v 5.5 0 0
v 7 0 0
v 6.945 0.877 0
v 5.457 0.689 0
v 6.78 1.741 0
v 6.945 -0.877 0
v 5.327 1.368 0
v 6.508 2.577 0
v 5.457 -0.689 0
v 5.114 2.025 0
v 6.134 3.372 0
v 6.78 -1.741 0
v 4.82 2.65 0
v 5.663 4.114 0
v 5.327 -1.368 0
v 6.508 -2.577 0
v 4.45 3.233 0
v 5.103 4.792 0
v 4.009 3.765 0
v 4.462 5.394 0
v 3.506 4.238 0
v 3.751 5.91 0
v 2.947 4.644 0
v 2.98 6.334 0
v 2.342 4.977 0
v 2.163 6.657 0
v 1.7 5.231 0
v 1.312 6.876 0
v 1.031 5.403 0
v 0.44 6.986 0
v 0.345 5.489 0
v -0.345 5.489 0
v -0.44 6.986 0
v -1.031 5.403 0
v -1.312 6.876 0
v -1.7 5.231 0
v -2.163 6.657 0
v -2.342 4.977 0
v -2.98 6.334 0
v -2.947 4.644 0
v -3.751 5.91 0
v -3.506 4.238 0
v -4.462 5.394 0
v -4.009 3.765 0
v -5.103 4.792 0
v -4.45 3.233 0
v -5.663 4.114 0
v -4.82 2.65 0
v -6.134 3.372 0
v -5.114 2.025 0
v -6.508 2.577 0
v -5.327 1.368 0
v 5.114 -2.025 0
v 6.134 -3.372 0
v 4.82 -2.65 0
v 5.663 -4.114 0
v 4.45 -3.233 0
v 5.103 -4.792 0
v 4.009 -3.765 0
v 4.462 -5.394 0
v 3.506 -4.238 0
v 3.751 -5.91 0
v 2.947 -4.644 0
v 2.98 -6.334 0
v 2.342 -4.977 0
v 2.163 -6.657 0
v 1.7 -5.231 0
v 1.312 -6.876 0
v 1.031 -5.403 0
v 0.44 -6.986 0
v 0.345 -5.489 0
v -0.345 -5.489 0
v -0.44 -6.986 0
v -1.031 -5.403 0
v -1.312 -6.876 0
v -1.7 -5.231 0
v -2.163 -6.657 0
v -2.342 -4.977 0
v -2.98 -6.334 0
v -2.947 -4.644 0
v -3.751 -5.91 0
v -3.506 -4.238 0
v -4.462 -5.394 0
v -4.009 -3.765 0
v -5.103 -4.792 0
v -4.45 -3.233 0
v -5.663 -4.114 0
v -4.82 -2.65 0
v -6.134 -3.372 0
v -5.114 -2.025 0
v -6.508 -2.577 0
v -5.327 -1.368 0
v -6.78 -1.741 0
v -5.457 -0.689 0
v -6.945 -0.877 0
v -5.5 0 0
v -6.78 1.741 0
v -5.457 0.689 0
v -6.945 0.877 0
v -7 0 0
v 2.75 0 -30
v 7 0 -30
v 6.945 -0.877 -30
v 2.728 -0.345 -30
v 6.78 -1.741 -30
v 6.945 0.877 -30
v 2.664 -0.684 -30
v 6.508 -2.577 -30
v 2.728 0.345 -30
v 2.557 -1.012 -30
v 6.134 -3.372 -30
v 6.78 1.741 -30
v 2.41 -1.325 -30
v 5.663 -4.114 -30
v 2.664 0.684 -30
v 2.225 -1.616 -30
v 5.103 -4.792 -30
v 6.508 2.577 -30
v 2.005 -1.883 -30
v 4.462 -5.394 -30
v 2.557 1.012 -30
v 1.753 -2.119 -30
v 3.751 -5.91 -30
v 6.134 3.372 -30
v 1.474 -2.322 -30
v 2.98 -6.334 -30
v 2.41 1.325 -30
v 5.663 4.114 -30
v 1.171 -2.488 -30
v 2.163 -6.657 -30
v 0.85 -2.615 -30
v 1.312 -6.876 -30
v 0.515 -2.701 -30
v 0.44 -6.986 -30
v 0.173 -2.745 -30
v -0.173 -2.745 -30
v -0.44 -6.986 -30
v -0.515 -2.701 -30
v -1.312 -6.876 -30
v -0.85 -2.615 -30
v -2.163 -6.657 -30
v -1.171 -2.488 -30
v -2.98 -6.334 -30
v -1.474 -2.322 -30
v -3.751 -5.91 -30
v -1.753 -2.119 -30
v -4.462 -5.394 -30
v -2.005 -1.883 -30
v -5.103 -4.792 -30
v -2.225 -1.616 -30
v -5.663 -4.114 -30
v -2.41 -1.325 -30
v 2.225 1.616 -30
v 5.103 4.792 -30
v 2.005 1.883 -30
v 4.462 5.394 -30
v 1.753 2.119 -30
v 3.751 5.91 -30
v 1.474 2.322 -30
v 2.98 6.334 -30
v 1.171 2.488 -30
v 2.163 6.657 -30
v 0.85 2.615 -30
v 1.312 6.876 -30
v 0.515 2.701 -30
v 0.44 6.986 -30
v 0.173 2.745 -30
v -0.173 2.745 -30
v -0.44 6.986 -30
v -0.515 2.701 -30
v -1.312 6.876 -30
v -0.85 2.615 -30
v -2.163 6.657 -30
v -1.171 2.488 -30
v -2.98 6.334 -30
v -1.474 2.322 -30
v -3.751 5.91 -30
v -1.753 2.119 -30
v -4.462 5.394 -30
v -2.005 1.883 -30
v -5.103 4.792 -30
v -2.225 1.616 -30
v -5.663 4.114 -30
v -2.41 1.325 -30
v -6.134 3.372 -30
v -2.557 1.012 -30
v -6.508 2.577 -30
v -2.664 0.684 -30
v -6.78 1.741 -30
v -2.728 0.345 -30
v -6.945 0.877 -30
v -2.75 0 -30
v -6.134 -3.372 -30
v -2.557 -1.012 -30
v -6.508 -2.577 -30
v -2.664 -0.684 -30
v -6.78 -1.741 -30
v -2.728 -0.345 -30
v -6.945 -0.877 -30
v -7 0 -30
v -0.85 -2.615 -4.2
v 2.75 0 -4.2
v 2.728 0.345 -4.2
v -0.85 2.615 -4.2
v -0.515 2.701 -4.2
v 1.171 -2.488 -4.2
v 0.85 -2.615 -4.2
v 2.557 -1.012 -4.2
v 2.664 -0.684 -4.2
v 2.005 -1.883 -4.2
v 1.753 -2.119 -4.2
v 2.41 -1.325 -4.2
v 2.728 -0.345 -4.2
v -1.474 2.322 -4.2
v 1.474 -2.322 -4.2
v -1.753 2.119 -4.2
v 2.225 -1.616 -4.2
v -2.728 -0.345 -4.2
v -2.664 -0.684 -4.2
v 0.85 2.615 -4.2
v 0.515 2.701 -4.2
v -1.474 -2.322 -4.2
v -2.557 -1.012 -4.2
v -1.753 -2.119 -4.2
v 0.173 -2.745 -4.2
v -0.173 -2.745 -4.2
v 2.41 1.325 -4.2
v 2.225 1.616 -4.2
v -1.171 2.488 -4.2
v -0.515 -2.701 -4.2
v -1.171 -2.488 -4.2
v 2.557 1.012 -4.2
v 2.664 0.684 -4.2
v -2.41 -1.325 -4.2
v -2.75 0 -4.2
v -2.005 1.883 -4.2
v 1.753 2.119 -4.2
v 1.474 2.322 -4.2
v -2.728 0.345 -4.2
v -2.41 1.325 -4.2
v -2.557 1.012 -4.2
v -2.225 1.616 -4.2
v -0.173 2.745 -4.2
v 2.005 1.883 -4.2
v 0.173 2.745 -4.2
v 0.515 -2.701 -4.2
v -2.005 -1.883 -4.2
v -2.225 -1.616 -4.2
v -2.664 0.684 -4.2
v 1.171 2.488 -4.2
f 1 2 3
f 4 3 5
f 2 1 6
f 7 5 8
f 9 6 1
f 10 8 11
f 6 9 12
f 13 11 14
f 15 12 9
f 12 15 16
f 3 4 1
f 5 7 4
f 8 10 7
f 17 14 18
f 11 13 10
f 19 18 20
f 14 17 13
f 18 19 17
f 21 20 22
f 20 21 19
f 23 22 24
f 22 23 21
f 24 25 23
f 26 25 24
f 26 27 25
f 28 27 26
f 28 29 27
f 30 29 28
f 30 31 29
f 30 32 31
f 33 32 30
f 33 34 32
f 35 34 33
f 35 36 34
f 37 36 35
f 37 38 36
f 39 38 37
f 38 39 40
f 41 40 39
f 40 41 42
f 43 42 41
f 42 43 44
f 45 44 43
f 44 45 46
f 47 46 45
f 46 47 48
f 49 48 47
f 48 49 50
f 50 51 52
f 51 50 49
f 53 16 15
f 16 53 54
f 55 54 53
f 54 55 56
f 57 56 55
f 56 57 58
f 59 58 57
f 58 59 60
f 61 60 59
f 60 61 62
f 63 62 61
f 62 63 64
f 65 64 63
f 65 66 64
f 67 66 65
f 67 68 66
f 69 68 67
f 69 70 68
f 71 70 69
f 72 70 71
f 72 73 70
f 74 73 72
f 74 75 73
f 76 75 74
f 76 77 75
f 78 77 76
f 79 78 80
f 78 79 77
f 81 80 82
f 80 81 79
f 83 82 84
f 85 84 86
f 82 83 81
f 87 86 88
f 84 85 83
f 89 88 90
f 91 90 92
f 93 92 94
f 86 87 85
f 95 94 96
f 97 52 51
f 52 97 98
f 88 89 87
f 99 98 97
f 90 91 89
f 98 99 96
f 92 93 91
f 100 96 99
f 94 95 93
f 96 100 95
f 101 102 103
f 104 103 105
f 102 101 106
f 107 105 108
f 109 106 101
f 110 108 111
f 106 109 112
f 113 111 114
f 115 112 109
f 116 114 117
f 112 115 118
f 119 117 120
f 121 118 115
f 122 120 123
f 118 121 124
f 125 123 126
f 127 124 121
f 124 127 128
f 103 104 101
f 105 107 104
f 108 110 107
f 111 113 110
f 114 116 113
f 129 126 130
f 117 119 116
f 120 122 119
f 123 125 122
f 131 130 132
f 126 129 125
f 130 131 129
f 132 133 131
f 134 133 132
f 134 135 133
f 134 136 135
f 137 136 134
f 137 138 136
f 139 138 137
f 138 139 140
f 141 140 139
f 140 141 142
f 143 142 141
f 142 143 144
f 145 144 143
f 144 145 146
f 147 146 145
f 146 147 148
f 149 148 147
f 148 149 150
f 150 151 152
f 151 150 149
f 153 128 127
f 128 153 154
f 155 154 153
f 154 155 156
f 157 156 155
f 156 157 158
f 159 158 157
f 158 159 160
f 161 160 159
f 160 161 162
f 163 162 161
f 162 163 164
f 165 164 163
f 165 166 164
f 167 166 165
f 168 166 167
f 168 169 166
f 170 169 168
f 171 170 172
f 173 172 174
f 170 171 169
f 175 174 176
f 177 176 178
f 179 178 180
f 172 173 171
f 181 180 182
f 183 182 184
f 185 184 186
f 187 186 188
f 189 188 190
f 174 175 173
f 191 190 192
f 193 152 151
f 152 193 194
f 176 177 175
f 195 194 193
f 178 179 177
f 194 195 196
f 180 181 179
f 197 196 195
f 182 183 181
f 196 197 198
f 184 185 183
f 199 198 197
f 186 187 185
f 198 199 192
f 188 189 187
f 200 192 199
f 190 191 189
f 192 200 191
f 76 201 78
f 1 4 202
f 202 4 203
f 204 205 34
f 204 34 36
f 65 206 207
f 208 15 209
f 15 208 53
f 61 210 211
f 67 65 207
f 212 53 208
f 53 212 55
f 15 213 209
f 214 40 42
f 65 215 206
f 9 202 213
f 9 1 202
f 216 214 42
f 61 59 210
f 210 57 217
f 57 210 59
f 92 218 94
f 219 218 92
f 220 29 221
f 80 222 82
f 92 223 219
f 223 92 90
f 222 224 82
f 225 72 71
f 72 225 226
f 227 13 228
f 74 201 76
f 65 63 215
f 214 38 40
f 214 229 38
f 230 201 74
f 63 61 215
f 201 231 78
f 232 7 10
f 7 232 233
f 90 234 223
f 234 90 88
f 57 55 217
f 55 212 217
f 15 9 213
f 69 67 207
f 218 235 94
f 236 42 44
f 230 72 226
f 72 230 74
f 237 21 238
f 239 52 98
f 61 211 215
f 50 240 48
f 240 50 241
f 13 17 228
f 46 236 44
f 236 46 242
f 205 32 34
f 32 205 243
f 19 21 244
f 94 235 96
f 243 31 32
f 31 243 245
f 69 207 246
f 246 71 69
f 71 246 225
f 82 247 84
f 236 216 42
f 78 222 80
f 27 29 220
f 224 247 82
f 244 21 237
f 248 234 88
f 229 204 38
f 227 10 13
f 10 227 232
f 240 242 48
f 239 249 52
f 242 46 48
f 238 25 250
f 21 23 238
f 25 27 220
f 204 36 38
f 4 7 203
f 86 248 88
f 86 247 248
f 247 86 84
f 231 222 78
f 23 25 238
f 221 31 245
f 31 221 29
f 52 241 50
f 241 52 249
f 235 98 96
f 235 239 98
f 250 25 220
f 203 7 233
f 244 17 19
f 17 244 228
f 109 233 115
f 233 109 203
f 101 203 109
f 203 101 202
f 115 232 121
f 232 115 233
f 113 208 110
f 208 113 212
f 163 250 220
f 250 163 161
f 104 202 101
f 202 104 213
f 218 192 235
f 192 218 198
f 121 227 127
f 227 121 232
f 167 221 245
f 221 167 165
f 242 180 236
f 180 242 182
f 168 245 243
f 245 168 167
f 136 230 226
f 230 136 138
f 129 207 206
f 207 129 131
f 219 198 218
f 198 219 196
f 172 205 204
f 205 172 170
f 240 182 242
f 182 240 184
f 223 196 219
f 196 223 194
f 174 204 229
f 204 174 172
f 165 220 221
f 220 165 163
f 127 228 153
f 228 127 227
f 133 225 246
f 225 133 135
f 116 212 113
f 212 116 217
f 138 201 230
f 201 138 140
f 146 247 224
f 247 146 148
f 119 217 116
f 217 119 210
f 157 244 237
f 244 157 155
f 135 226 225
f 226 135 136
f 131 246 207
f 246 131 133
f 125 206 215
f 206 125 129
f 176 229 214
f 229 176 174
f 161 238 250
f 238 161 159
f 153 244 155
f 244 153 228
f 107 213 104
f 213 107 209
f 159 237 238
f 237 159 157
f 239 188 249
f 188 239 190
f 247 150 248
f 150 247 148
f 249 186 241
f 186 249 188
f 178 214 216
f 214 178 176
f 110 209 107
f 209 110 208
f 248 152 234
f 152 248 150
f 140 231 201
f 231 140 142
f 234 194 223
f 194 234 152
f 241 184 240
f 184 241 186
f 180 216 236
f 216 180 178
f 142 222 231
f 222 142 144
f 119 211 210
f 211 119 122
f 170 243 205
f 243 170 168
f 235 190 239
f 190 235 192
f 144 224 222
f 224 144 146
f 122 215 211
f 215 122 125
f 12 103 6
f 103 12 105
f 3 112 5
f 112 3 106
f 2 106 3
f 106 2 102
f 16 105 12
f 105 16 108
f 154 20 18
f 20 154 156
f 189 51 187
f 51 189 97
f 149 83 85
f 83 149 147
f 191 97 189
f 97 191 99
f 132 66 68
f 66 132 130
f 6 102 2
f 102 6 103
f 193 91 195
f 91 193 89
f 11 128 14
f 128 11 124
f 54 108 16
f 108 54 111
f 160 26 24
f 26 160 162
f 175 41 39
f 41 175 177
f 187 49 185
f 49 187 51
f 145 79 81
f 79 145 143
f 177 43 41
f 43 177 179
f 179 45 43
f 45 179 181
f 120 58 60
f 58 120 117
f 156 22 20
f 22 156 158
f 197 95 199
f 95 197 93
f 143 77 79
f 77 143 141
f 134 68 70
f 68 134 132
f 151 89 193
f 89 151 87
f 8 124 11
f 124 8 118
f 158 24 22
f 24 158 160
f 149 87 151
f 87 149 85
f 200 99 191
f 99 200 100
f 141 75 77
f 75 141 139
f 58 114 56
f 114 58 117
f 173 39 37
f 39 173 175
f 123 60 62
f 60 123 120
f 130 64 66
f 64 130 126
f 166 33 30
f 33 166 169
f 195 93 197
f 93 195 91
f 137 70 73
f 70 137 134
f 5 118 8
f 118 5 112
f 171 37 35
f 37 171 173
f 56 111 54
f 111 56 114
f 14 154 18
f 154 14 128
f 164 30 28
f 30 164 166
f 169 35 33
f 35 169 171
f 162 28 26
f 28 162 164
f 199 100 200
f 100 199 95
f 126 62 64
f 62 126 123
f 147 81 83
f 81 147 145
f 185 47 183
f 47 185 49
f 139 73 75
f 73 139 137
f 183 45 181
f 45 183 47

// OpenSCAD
$fn = 50;


difference() {
	union() {
		translate(v = [0, 0, -30.0000000000]) {
			cylinder(h = 30, r = 7.0000000000);
		}
		cylinder(h = 0, r = 13.0000000000);
	}
	union() {
		translate(v = [0, 0, 0]) {
			rotate(a = [0, 0, 0]) {
				difference() {
					union() {
						#translate(v = [0, 0, -30.0000000000]) {
							cylinder(h = 30, r = 2.2500000000);
						}
						#translate(v = [0, 0, -4.2000000000]) {
							cylinder(h = 4.2000000000, r1 = 2.7500000000, r2 = 5.5000000000);
						}
						#translate(v = [0, 0, -30.0000000000]) {
							cylinder(h = 30, r = 2.7500000000);
						}
						#translate(v = [0, 0, -30.0000000000]) {
							cylinder(h = 30, r = 2.2500000000);
						}
					}
					union();
				}
			}
		}
	}
}
